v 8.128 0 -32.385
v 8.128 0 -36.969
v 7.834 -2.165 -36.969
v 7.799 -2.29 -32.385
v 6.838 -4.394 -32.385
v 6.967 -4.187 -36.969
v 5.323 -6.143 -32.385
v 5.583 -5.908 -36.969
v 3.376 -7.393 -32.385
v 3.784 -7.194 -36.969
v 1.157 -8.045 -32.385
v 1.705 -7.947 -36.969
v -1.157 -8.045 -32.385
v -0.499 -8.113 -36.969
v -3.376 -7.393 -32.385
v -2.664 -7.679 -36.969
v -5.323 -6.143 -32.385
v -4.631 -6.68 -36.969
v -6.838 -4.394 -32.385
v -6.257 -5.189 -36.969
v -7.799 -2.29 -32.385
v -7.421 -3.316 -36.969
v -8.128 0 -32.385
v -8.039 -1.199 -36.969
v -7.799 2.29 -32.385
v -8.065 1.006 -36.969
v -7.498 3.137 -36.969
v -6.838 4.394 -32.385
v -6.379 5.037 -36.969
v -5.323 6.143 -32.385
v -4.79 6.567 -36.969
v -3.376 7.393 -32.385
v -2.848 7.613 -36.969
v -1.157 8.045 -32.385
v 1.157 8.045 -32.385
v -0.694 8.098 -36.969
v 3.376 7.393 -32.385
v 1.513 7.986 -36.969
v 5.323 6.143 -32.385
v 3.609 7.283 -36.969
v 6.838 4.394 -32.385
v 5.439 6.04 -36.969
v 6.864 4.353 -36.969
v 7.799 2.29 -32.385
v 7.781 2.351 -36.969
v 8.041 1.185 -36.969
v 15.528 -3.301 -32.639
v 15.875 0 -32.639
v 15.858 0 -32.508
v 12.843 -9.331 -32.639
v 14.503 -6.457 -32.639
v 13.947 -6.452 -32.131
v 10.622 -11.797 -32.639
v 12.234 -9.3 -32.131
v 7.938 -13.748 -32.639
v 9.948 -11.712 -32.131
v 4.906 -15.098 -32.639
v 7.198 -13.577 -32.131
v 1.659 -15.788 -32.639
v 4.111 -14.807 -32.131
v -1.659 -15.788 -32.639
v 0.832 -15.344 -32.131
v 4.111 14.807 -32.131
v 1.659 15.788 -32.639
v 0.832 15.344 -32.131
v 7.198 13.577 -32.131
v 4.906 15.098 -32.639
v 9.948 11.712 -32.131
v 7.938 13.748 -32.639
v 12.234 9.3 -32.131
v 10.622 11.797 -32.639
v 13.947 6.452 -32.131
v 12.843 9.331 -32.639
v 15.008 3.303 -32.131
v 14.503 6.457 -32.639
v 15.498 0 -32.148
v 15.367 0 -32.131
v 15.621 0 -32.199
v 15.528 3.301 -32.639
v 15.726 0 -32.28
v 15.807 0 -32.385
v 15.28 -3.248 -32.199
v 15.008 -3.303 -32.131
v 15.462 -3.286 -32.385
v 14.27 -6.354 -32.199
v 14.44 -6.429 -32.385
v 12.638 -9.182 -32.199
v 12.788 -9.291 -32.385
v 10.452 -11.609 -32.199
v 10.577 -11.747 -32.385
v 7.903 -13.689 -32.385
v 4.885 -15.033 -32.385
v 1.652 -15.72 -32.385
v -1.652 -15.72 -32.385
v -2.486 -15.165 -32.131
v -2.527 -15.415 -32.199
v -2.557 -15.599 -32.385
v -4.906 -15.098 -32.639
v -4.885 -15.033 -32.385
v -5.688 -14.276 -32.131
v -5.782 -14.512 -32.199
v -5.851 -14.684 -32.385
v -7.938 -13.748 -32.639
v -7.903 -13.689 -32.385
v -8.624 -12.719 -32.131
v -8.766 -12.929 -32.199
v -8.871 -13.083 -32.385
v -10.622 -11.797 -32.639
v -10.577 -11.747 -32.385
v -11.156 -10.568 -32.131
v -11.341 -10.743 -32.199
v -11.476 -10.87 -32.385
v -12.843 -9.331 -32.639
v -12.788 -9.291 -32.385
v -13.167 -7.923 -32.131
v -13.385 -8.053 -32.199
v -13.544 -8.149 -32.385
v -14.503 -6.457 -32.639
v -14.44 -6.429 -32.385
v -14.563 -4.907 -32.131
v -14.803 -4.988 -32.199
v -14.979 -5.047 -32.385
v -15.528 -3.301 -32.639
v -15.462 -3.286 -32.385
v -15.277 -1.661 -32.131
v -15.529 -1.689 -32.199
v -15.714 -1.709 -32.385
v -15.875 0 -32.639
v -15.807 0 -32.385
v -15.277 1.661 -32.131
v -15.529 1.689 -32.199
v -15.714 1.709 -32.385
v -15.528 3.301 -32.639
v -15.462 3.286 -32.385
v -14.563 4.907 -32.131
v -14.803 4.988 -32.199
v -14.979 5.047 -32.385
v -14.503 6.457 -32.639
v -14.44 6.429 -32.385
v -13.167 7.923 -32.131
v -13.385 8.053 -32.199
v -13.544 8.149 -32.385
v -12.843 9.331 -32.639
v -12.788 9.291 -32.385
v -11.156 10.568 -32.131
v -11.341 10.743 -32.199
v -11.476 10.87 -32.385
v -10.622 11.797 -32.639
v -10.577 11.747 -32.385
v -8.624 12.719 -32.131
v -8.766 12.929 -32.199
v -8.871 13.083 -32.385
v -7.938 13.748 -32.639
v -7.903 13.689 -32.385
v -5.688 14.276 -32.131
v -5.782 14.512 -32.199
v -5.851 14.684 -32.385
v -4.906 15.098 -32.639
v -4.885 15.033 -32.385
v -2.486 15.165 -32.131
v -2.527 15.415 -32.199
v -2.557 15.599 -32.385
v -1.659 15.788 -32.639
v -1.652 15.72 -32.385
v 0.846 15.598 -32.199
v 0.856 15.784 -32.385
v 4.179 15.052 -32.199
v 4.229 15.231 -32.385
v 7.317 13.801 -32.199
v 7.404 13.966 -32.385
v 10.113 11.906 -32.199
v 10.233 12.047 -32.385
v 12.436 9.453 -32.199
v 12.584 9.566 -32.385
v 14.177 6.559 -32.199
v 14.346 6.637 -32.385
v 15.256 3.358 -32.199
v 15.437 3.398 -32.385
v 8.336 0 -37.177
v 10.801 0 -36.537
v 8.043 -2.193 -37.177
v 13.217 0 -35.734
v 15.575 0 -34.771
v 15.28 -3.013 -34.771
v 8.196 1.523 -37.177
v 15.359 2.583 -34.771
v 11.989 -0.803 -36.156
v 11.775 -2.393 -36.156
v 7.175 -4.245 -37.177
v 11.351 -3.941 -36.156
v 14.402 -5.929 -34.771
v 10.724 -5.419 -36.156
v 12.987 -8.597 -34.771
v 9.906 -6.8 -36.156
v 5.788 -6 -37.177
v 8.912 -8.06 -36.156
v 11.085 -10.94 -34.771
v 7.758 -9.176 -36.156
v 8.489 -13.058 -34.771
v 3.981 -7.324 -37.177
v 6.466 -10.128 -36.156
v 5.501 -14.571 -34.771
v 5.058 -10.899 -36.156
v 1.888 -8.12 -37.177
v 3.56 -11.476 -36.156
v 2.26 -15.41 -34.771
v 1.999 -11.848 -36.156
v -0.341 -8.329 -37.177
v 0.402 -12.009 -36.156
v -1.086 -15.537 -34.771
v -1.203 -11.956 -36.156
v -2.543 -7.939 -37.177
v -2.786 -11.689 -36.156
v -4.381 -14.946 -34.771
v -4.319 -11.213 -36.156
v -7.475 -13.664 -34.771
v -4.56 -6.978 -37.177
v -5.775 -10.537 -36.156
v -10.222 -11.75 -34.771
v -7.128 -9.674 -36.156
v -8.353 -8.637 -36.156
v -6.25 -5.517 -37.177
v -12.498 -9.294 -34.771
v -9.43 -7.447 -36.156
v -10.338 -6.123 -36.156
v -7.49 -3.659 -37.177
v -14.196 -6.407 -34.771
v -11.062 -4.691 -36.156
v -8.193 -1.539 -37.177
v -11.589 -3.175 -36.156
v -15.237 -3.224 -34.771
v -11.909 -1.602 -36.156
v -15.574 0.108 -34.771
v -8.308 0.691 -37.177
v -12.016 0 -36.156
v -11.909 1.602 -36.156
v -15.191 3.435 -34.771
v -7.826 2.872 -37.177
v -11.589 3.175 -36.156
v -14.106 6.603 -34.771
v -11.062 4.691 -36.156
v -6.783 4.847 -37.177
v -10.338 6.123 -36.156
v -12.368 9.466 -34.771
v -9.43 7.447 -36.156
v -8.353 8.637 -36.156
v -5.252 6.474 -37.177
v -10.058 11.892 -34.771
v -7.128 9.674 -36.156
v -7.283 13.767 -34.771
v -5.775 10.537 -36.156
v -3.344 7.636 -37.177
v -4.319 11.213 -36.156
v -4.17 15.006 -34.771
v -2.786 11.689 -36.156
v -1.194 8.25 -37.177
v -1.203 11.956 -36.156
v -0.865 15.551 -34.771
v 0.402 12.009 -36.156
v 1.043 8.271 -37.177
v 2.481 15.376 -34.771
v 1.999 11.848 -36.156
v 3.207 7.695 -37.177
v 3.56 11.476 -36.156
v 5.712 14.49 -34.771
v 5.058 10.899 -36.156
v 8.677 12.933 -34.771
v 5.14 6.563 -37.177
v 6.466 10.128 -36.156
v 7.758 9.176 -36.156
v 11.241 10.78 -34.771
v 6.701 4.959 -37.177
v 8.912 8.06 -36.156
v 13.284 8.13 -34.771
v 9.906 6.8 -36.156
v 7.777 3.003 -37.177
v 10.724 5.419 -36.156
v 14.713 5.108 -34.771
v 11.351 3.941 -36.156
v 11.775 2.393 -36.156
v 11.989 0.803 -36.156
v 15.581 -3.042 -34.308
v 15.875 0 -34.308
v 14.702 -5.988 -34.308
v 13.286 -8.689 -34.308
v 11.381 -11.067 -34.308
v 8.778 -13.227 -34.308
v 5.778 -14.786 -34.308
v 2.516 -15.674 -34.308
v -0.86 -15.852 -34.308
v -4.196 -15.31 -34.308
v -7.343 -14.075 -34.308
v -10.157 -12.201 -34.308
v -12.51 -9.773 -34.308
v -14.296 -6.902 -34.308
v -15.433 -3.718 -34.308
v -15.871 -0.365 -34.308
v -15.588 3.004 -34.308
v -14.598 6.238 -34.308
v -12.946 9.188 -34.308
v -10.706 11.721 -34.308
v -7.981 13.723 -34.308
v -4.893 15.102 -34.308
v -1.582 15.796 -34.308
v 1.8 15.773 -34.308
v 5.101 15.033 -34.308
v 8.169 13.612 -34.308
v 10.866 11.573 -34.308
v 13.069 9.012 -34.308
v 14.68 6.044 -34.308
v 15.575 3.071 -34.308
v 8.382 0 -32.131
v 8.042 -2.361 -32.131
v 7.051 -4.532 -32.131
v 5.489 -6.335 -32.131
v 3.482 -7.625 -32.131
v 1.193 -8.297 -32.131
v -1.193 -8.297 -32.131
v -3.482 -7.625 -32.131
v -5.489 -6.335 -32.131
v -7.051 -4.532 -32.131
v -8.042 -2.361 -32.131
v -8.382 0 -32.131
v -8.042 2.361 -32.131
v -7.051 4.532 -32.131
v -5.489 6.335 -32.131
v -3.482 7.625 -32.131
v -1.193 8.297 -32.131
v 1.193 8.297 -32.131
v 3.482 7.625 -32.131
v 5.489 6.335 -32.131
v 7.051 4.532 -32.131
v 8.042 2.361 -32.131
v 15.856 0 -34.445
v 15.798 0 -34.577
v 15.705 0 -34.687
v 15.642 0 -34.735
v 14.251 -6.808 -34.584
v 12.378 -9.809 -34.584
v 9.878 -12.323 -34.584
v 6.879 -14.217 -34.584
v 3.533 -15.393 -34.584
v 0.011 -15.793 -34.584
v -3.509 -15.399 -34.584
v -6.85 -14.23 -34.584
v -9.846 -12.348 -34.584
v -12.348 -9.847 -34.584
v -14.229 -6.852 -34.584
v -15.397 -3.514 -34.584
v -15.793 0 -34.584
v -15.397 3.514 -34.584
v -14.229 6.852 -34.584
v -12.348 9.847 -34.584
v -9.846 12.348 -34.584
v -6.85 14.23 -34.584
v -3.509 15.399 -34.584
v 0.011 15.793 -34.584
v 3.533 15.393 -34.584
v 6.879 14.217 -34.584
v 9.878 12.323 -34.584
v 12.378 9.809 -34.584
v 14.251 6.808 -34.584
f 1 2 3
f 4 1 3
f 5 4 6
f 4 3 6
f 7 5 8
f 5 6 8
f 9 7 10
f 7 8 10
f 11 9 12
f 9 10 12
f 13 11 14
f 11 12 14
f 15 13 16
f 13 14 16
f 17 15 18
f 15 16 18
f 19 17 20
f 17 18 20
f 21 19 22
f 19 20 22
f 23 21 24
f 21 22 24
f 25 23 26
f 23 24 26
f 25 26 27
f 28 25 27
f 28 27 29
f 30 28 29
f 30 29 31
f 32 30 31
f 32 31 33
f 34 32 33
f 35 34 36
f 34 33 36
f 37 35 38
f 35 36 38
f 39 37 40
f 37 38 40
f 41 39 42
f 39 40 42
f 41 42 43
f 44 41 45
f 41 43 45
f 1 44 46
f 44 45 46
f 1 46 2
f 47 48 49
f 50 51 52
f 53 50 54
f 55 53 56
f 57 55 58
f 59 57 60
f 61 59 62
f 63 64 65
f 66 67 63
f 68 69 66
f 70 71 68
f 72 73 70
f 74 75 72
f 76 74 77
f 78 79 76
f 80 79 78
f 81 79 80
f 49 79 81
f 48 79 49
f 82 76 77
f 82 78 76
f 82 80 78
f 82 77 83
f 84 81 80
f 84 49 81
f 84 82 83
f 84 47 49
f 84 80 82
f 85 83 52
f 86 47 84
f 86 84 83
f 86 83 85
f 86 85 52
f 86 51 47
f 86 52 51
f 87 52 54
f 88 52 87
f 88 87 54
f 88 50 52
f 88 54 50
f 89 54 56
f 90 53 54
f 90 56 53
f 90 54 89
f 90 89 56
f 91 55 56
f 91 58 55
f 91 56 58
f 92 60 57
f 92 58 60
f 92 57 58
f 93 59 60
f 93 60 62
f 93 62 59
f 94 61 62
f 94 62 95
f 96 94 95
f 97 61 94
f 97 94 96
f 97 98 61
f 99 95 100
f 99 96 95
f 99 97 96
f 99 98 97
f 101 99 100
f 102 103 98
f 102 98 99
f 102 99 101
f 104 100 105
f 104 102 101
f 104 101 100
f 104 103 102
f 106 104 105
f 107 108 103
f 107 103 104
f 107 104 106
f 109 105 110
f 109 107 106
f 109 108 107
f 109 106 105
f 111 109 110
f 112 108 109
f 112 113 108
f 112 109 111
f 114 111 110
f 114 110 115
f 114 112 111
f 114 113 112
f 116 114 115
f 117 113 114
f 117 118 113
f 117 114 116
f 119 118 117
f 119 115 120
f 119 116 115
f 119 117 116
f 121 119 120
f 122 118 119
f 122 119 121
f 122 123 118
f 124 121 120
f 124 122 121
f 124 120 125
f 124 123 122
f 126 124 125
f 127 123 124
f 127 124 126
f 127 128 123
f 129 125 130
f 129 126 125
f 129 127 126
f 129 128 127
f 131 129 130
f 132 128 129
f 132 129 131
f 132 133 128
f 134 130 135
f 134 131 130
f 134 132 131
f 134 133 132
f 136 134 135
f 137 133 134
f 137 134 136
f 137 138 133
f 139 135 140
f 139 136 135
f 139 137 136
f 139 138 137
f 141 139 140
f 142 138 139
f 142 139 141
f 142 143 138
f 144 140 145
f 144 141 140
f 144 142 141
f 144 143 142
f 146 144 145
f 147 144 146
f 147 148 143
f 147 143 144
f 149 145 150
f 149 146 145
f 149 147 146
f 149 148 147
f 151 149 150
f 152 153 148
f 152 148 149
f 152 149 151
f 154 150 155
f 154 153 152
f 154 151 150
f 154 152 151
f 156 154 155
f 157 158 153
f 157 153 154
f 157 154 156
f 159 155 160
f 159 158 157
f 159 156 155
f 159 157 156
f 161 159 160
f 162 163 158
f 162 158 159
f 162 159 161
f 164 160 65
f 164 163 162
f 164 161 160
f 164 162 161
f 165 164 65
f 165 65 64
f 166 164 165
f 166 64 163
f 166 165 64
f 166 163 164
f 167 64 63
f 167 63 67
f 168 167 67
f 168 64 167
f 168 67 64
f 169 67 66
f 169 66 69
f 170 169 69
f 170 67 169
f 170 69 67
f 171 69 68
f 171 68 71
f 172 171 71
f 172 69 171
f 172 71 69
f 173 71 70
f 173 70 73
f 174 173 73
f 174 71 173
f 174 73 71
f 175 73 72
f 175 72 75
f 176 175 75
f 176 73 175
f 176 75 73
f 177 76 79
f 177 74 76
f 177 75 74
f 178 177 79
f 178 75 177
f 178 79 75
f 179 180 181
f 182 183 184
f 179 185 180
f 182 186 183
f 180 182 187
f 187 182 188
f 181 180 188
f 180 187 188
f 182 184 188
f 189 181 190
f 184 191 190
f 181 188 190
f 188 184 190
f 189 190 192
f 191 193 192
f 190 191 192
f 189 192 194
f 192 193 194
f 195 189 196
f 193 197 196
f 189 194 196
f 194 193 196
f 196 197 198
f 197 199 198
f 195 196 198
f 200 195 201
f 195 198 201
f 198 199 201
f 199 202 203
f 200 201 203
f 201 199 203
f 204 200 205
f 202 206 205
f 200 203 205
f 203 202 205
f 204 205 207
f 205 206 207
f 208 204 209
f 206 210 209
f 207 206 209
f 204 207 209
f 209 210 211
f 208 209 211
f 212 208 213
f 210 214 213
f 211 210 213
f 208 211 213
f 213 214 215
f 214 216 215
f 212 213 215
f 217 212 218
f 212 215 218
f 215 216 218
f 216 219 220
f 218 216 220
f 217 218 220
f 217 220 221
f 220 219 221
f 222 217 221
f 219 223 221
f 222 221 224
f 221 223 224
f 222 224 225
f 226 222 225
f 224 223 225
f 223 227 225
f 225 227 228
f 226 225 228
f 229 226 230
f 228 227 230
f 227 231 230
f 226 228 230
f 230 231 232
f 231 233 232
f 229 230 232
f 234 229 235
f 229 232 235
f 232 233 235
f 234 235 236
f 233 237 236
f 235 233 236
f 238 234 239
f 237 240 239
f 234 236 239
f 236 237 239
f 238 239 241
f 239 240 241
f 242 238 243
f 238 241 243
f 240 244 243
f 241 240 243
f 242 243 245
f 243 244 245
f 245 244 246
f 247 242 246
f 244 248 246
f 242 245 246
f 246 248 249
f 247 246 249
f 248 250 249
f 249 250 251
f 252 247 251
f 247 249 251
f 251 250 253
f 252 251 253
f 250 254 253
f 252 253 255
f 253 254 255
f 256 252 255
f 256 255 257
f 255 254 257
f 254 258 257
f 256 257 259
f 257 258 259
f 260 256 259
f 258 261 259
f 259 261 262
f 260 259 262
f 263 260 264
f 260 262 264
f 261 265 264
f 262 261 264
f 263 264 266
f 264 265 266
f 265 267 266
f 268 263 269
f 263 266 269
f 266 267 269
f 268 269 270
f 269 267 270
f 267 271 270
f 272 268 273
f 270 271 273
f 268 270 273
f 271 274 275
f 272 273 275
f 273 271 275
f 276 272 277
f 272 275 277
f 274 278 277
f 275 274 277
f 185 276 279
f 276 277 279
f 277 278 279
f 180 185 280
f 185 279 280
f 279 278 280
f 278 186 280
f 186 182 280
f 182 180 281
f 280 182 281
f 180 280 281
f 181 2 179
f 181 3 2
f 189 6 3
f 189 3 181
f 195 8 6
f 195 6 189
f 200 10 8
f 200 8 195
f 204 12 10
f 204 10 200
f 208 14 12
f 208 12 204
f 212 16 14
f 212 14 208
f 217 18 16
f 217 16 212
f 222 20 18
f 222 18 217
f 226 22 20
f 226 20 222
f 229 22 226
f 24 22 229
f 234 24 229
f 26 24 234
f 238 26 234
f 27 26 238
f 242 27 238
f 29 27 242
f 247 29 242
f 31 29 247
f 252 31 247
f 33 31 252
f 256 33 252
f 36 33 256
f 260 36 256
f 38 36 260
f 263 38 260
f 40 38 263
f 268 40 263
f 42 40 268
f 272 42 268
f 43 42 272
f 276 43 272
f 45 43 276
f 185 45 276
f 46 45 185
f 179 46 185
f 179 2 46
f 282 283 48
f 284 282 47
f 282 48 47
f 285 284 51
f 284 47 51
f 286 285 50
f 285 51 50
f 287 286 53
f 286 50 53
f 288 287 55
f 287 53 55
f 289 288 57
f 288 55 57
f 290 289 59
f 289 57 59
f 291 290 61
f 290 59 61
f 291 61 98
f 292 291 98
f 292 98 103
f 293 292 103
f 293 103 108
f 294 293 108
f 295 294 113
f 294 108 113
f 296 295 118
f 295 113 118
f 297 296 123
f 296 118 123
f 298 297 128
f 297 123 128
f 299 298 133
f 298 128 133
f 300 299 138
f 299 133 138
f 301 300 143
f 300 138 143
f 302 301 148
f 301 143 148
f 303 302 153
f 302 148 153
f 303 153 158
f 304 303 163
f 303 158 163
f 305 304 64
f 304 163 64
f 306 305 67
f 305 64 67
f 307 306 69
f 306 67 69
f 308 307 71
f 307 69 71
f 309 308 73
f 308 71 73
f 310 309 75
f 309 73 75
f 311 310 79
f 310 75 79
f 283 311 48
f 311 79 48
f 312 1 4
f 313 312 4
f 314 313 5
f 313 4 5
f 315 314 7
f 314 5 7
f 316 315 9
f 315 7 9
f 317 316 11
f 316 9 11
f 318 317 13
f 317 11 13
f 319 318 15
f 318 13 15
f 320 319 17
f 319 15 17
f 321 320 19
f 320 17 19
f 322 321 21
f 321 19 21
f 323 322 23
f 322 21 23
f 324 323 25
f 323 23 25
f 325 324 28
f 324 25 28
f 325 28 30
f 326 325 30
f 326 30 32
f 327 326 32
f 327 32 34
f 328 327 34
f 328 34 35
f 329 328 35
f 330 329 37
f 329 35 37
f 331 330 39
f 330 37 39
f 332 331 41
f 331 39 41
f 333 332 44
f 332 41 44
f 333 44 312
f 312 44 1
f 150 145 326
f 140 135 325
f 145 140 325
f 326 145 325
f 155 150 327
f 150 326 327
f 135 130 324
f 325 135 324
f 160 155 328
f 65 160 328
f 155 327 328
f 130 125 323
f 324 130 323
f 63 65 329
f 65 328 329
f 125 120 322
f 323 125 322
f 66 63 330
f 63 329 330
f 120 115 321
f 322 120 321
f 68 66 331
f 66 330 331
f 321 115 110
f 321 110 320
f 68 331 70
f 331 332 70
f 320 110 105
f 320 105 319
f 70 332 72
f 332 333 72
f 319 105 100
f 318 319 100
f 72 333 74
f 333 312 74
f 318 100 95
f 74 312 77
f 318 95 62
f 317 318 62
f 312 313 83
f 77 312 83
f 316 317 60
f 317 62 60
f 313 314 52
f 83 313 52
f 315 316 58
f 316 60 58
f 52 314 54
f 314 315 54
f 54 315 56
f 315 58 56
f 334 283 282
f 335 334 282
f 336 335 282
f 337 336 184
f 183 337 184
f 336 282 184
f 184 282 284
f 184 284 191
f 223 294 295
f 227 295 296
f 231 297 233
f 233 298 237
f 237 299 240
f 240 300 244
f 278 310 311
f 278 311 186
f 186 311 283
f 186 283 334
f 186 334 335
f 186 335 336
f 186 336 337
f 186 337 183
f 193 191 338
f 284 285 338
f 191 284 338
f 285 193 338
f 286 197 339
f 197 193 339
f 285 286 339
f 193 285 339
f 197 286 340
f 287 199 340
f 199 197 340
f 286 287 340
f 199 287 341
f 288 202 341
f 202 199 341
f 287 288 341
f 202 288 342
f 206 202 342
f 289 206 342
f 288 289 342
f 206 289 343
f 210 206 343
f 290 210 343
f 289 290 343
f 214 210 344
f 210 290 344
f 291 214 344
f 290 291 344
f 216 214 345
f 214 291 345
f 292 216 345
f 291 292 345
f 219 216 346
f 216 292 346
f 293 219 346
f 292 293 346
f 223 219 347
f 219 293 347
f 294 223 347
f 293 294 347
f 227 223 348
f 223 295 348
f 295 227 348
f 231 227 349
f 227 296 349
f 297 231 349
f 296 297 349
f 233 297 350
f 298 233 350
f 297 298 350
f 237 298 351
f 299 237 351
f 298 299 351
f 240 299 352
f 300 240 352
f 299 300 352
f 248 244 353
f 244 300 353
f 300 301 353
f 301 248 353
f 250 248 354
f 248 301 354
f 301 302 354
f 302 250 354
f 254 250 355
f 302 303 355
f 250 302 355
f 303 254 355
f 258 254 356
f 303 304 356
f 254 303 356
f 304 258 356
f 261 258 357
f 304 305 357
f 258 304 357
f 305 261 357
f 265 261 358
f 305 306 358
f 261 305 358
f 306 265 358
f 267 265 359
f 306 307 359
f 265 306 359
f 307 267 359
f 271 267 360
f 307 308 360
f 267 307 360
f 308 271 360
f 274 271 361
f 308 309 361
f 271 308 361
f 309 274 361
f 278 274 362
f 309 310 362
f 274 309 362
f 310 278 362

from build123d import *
from OCP.BRepFilletAPI import BRepFilletAPI_MakeChamfer

# Parameters (mm, degrees)
CHAMFER1_SIZE  = 0.254
CHAMFER1_SIZE2 = 0.213389286
FILLET1_R      = 0.508


with BuildPart() as part:
    # Sketch1 → Revolve1 (revolve)
    with BuildSketch(Plane(origin=(0, 0, 0), x_dir=(0, 0, -1), z_dir=(1, 0, 0)), mode=Mode.PRIVATE) as revolve1_sk:
        with BuildLine():
            Line((32.131, 15.875), (32.131, 8.128))
            Line((32.131, 8.128), (37.222917887, 8.128))
            ThreePointArc((37.222917887, 8.128), (36.1372367, 12.071044848), (34.635160964, 15.875))
            Line((34.635160964, 15.875), (32.131, 15.875))
        make_face()
    revolve(revolve1_sk.sketch.rotate(Axis((0, 0, 0), (0, 0, -1)), 90), axis=Axis((0, 0, 0), (0, 0, -1)))

    # Chamfer1: one chamfer whose edges measure the first distance from different faces: ONE call of the kernel's chamfer builder (chamfer() names one face for all edges)
    chamfer1_edges_1 = [part.edges().sort_by_distance(p)[0] for p in [
        (-8.128, 0, -37.222917887),
    ]]
    chamfer1_side_1 = [part.faces().sort_by_distance(p)[0] for p in [
        (-8.128, 0, -34.676958943),
    ]]
    chamfer1_edges_2 = [part.edges().sort_by_distance(p)[0] for p in [
        (-8.128, 0, -32.131),
    ]]
    chamfer1 = BRepFilletAPI_MakeChamfer(part.part.solid().wrapped)
    for e in chamfer1_edges_1:
        chamfer1.Add(CHAMFER1_SIZE, CHAMFER1_SIZE2, e.wrapped, chamfer1_side_1[0].wrapped)  # the first distance lies on this face
    for e in chamfer1_edges_2:
        chamfer1.Add(CHAMFER1_SIZE, e.wrapped)
    add(Compound.cast(chamfer1.Shape()), mode=Mode.REPLACE)

    # Fillet1
    fillet1_edges = [part.edges().sort_by_distance(p)[0] for p in [
        (-15.875, 0, -34.635160964),
        (-15.875, 0, -32.131),
    ]]
    fillet(fillet1_edges, radius=FILLET1_R)


solid = part.part
